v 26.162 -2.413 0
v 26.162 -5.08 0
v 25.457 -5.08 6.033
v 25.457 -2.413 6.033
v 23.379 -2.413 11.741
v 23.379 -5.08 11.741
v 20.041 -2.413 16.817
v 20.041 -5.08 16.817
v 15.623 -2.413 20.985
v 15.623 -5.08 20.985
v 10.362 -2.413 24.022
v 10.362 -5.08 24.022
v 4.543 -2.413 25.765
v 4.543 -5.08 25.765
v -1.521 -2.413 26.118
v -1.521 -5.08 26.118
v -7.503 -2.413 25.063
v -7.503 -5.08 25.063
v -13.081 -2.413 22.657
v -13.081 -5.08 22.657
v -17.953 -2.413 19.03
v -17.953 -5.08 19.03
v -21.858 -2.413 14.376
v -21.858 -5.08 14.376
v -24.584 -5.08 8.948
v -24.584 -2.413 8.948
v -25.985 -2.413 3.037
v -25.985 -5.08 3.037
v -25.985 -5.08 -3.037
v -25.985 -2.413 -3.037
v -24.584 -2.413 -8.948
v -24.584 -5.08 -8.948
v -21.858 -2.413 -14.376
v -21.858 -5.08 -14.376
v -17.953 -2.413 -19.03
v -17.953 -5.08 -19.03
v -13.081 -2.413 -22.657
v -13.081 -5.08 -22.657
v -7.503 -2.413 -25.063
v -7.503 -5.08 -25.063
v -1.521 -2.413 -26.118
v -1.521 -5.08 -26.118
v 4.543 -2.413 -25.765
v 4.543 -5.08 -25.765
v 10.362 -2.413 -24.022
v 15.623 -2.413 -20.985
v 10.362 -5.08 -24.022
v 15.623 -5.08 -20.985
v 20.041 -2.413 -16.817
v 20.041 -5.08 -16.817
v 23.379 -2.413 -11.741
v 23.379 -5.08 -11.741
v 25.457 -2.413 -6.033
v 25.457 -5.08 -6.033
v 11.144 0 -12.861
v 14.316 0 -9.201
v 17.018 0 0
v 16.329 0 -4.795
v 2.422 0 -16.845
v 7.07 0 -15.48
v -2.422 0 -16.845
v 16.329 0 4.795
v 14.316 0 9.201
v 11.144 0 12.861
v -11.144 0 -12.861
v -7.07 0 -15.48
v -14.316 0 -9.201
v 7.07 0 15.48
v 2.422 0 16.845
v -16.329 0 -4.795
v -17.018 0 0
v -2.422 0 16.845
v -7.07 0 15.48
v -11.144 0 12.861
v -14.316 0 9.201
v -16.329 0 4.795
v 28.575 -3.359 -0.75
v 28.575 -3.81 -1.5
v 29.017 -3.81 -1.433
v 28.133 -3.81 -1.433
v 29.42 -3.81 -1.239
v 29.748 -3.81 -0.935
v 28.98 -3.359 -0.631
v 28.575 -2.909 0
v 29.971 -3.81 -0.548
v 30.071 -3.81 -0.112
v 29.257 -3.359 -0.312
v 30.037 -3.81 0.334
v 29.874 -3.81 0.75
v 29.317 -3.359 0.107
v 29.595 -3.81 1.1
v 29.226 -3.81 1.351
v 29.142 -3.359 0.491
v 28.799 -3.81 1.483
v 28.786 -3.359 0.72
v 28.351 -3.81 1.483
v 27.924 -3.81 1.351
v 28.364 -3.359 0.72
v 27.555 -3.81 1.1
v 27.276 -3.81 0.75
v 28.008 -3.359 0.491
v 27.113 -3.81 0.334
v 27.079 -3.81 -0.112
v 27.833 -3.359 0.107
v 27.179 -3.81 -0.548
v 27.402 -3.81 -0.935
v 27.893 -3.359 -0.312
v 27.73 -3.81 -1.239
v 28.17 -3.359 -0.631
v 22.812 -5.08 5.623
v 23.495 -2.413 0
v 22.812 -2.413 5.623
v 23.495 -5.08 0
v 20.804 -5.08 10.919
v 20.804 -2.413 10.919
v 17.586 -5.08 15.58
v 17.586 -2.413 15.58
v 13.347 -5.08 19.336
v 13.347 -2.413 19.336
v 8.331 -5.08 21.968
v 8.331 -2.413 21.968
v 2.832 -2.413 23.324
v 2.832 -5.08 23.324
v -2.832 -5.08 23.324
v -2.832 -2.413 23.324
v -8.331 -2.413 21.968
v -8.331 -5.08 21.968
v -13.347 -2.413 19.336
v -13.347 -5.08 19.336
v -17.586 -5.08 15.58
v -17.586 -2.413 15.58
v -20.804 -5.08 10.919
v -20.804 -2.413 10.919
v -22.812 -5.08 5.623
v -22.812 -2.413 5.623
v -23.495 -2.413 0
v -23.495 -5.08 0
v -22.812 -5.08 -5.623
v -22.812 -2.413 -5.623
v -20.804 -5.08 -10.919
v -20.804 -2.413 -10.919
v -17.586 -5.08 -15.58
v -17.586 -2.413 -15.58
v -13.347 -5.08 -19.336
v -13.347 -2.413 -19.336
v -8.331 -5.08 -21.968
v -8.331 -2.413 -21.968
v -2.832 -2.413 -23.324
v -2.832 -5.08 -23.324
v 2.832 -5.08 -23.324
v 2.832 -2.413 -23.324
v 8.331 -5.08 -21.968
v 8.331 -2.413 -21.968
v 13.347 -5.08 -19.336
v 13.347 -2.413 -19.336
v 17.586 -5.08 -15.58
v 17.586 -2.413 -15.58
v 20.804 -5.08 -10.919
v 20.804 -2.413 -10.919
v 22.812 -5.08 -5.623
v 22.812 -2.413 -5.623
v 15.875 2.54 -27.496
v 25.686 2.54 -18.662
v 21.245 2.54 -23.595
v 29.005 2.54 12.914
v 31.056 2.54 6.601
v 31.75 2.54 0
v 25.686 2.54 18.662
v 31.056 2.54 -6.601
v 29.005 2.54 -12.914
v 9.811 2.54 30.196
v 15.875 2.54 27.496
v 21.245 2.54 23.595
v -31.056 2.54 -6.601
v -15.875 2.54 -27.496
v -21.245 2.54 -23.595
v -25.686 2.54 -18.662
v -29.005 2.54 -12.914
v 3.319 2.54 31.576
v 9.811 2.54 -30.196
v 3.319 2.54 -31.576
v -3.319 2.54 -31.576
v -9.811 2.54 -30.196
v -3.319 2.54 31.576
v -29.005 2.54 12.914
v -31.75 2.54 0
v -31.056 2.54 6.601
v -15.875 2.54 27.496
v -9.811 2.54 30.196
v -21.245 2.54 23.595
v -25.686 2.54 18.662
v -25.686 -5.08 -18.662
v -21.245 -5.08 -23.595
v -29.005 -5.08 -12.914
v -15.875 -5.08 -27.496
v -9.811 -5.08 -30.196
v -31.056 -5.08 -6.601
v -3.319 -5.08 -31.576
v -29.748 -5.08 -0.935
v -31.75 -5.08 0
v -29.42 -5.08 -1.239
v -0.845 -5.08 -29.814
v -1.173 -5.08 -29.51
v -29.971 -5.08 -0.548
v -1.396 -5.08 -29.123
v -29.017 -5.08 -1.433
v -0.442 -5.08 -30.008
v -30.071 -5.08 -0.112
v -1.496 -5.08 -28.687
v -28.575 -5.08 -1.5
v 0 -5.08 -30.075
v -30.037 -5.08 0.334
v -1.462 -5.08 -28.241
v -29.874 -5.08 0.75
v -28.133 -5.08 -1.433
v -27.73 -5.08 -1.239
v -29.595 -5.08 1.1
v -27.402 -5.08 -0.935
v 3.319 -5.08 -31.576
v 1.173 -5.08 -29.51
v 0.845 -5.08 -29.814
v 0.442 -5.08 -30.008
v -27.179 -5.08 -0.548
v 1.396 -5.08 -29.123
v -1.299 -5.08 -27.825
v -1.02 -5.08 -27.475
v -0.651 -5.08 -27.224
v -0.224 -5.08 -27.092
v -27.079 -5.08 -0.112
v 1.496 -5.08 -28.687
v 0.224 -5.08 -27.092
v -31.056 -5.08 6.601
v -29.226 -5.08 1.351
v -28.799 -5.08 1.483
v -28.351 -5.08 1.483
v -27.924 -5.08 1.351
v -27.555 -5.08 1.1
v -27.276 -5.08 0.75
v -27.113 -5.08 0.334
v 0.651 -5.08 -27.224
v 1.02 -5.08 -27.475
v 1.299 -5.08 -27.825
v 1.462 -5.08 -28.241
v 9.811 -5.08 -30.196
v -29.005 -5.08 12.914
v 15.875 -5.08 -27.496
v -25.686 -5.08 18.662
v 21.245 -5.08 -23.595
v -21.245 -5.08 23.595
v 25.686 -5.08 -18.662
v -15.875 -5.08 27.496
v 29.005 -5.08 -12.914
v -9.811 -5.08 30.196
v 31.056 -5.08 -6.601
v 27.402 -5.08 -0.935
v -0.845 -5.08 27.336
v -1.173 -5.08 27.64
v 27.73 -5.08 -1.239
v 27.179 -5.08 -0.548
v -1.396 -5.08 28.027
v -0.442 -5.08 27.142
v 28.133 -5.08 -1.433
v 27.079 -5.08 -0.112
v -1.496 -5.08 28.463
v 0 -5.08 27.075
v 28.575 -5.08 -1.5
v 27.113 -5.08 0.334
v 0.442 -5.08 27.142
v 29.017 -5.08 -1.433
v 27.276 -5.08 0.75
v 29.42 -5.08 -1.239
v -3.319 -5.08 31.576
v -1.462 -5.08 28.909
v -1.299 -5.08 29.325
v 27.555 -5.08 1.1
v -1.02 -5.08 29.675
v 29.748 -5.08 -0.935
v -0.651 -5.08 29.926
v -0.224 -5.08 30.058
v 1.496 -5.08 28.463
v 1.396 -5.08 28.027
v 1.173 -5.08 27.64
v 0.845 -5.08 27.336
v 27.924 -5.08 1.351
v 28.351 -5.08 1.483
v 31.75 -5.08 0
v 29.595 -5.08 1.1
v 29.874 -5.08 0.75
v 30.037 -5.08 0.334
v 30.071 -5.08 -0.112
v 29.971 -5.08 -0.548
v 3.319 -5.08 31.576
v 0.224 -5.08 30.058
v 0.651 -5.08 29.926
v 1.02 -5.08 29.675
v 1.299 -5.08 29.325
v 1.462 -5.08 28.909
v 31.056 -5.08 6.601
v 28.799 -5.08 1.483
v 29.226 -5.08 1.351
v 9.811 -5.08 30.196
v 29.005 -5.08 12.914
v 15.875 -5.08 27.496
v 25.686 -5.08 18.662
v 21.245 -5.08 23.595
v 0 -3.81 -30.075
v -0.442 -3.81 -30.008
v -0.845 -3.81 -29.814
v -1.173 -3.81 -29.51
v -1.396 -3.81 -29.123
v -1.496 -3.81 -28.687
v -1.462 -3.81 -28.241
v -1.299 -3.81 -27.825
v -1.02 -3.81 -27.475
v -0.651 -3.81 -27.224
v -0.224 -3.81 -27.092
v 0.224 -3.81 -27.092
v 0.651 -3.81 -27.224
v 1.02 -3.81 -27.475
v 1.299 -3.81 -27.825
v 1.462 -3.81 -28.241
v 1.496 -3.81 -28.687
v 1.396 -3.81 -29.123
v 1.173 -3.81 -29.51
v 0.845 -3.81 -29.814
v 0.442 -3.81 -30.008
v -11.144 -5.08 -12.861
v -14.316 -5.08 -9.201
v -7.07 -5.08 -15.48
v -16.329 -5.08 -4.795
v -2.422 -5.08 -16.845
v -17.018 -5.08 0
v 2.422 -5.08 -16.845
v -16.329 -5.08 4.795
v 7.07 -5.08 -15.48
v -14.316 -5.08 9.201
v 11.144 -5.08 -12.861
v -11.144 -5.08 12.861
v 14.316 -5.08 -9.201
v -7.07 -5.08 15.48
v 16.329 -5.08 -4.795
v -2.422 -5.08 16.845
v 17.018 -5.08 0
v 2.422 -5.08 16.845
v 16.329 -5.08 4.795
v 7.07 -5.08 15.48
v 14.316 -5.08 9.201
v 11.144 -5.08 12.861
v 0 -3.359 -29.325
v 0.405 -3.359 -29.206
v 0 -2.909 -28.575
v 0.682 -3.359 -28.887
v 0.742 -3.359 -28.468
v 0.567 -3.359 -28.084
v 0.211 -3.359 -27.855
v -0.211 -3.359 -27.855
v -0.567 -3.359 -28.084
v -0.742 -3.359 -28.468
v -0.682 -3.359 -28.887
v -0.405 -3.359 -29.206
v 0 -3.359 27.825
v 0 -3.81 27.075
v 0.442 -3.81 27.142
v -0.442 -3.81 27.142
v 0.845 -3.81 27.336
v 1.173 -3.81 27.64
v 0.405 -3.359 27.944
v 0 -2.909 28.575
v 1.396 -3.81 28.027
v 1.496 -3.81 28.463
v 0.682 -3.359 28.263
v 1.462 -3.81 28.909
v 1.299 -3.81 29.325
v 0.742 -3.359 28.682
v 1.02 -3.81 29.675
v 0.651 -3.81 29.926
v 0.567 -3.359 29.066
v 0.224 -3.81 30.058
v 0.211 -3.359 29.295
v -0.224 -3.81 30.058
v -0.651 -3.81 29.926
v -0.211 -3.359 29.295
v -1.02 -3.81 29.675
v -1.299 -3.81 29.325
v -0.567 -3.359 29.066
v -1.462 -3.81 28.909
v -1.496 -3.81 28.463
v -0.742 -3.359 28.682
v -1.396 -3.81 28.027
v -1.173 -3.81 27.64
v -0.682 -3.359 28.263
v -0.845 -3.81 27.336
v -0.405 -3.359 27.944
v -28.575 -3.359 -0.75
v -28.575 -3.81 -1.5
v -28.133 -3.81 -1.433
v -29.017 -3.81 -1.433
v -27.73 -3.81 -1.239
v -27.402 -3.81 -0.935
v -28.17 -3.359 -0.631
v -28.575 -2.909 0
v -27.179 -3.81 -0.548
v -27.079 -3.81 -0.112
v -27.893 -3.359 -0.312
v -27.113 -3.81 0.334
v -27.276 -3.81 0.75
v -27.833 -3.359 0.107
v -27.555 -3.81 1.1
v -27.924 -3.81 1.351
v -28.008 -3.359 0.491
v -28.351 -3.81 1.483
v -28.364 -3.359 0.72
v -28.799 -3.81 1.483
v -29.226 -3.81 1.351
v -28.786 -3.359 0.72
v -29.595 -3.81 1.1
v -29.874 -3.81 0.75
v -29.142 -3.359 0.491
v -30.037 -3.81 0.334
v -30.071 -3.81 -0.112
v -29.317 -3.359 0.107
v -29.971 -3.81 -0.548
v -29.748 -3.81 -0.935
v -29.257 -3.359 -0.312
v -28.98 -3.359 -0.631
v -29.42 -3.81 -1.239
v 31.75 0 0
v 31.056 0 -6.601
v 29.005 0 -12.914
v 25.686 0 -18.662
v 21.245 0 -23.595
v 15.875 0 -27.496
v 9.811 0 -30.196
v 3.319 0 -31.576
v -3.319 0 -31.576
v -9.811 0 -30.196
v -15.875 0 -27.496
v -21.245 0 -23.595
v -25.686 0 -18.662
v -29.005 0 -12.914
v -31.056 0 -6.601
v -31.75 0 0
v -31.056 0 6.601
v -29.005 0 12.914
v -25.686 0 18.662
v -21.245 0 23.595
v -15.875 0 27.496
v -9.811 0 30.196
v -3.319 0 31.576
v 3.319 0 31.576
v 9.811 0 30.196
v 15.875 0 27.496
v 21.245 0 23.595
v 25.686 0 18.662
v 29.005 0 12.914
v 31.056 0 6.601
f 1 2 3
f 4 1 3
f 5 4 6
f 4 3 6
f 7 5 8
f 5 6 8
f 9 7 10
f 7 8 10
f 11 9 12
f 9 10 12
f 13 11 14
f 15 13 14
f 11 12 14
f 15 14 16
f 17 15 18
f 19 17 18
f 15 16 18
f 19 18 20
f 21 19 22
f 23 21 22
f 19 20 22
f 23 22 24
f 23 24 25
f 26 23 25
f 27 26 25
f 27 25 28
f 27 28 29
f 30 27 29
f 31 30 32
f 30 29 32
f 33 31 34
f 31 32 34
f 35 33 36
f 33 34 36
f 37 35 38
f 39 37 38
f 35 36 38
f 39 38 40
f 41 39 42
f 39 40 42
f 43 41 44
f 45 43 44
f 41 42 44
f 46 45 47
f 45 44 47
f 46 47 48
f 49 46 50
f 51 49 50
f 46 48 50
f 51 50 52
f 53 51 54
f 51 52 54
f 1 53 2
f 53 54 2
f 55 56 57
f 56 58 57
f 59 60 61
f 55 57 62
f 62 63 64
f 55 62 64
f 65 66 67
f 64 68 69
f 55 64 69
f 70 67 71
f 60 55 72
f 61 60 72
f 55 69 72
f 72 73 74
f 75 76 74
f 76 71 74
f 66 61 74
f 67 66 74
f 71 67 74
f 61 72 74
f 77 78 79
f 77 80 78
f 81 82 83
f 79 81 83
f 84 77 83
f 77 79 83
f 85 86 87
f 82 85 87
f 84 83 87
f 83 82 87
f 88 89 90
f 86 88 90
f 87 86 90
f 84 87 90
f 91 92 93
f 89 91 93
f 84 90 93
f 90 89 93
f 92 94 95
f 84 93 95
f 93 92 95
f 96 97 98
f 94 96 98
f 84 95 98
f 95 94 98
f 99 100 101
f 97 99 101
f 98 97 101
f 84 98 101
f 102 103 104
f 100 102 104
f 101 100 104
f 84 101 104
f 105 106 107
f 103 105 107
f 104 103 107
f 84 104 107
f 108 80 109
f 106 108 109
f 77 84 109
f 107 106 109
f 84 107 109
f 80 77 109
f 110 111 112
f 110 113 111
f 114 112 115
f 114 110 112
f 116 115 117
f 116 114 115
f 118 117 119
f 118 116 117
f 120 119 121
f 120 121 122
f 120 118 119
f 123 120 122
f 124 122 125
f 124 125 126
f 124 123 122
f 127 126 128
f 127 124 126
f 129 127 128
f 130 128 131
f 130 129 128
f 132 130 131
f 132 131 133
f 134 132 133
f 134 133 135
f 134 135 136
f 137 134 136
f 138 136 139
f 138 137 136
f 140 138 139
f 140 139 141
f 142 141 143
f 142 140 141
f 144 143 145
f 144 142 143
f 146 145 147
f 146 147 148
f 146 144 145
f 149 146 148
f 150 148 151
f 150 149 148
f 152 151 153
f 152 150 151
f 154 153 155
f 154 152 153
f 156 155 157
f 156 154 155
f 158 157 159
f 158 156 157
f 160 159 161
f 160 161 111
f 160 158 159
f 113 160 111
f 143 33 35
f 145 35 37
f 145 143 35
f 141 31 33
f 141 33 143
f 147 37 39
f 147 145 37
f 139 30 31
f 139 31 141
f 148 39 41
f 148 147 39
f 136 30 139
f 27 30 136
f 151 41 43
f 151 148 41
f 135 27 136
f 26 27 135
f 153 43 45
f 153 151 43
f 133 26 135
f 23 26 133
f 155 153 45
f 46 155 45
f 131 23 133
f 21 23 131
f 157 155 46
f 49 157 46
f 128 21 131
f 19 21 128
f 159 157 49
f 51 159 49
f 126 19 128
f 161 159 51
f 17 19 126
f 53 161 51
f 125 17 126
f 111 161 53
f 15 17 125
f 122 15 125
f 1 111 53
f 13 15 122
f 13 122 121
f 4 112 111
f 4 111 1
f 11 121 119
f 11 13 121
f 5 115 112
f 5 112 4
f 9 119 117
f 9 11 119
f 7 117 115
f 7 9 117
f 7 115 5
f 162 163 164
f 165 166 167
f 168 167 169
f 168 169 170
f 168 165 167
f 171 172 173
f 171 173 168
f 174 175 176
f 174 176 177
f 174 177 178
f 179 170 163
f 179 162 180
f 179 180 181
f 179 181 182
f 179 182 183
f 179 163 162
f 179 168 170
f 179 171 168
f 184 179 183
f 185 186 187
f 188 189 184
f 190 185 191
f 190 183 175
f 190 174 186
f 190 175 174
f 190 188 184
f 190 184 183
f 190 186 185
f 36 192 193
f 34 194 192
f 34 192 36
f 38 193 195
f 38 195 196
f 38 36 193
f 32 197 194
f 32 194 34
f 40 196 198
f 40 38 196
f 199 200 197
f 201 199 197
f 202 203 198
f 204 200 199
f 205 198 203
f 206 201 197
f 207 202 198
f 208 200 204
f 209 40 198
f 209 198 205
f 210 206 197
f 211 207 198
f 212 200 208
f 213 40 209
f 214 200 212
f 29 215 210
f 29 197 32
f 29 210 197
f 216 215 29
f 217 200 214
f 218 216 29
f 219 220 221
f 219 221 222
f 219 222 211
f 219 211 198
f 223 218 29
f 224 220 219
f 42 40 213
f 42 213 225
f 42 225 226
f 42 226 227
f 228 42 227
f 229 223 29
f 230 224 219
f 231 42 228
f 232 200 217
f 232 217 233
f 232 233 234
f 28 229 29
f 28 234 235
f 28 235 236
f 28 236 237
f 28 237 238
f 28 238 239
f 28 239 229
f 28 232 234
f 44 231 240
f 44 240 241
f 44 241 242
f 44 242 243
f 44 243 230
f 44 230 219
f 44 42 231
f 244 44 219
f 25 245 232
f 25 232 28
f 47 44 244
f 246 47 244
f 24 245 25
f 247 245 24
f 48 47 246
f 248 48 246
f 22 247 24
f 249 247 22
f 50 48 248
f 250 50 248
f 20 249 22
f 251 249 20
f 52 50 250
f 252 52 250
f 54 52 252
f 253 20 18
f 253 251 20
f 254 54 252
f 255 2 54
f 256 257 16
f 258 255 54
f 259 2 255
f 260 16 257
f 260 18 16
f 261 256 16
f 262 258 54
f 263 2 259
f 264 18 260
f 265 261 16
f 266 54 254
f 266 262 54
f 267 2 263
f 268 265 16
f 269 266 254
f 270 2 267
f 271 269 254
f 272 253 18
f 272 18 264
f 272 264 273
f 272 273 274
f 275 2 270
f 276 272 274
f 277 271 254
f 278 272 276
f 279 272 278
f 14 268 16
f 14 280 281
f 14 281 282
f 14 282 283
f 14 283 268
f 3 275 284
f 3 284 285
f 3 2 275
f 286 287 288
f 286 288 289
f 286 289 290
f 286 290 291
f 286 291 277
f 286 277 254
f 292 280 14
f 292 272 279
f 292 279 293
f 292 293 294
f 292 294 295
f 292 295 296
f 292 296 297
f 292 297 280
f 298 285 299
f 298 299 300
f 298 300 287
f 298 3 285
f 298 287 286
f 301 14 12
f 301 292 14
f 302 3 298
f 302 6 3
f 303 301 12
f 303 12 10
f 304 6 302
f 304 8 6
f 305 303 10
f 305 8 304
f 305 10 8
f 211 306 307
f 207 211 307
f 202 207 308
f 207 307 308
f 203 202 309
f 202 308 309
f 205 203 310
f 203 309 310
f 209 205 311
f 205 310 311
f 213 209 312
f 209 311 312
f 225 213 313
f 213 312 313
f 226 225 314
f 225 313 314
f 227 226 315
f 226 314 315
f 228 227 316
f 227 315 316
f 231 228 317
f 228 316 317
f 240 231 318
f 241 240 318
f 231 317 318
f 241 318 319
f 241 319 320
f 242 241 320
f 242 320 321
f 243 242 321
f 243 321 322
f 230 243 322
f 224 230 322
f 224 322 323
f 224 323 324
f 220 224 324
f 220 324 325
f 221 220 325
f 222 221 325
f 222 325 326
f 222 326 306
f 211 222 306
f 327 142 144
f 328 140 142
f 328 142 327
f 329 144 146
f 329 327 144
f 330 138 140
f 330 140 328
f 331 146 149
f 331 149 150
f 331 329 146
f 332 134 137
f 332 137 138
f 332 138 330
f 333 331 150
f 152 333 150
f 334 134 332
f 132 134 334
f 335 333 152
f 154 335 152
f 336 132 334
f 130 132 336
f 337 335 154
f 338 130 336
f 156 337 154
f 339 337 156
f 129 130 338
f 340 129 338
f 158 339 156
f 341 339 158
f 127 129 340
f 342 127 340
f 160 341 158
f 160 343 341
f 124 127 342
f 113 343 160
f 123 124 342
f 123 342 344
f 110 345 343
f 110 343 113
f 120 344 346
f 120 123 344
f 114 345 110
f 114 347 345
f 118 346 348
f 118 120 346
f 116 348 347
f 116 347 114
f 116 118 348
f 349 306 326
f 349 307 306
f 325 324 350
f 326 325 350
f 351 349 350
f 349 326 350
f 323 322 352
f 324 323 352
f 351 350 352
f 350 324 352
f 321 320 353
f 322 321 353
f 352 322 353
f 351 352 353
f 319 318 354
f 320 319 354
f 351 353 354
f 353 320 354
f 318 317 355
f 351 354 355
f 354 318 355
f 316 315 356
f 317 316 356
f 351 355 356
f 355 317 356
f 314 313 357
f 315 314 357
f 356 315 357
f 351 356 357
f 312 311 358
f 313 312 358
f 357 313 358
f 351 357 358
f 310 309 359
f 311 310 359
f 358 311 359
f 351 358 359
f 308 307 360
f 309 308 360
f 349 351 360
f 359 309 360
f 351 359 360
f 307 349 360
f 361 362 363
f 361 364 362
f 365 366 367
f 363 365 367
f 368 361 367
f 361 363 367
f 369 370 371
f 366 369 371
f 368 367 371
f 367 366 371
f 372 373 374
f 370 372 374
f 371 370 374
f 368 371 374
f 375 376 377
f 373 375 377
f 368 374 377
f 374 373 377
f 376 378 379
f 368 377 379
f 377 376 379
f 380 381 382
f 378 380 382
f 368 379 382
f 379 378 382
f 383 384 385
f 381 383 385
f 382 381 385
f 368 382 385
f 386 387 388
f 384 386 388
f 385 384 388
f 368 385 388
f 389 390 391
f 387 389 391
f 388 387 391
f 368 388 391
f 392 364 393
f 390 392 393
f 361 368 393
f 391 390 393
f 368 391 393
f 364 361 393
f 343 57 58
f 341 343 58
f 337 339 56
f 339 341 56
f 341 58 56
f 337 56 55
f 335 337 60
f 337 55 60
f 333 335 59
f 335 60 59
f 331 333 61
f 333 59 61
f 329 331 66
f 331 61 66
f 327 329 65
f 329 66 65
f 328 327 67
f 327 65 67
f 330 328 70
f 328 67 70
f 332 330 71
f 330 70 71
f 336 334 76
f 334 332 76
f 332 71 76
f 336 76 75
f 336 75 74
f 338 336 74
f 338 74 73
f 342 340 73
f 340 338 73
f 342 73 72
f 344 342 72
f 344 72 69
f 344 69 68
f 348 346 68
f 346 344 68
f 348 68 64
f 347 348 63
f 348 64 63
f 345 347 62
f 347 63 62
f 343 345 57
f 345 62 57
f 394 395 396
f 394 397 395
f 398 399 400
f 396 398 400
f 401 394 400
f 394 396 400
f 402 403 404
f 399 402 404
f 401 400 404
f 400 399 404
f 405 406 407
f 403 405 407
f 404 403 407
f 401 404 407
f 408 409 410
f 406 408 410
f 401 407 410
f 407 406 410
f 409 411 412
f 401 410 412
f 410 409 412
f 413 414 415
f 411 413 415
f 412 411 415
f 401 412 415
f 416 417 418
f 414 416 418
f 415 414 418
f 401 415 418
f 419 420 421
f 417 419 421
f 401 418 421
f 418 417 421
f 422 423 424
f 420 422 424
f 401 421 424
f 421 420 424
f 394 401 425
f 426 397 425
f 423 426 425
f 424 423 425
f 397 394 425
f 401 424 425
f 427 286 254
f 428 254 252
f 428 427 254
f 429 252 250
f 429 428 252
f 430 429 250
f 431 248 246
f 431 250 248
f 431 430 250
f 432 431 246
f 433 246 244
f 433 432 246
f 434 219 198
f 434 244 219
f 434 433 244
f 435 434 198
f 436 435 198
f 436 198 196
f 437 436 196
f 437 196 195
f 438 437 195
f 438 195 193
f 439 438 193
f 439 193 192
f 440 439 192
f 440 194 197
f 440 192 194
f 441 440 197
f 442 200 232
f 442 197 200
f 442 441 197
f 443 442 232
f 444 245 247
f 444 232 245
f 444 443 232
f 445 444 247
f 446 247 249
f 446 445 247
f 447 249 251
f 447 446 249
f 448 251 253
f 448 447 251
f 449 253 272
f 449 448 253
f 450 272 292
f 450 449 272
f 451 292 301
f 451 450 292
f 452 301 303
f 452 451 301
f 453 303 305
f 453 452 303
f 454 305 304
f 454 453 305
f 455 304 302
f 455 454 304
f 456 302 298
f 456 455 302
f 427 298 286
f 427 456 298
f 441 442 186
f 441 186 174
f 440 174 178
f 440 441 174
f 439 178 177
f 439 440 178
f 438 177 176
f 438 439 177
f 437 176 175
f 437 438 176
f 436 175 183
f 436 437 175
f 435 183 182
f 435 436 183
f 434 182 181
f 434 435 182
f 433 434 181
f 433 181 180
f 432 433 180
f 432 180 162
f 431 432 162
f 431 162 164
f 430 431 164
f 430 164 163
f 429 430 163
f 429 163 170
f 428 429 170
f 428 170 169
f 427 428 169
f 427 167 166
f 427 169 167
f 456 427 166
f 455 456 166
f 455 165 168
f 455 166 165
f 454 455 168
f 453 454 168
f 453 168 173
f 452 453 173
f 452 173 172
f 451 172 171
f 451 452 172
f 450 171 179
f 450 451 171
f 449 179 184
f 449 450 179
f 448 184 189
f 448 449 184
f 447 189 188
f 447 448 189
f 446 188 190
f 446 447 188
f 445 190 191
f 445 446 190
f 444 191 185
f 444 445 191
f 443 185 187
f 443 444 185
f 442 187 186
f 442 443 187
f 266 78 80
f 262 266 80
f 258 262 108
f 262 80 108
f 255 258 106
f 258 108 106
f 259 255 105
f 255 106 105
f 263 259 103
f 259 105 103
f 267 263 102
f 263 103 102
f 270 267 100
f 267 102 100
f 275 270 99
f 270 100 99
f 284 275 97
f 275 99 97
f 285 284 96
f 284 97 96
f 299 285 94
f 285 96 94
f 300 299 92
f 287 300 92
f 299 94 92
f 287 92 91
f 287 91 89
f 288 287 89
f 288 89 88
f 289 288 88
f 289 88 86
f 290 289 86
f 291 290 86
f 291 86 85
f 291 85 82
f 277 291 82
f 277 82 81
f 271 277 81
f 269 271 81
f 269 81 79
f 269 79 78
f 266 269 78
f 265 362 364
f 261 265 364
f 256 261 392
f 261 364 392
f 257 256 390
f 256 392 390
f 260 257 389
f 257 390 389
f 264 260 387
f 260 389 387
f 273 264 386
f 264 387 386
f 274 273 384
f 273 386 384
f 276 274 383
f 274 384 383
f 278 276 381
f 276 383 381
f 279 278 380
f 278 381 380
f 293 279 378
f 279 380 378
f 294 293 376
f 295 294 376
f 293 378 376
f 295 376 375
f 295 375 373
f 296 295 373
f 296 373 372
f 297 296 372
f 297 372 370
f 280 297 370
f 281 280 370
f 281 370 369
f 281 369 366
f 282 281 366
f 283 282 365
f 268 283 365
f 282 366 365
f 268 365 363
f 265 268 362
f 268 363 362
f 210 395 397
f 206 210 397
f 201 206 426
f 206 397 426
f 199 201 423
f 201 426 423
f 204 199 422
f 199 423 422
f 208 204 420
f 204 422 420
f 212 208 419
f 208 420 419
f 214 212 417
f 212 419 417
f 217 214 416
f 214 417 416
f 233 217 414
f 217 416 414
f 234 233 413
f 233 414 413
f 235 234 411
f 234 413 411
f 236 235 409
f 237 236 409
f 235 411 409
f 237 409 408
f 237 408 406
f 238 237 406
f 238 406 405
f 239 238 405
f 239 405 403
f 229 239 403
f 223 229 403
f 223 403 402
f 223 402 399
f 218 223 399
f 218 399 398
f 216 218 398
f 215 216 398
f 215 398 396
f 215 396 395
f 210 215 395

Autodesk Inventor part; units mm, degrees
ref_plane "YZ Plane" through (0, 0, 0) normal (1, 0, 0) x (0, 1, 0)
ref_plane "XZ Plane" through (0, 0, 0) normal (0, 1, 0) x (-1, 0, 0)
ref_plane "XY Plane" through (0, 0, 0) normal (0, 0, 1) x (1, 0, 0)
sketch "Sketch1" plane through (0, 0, 0) normal (0, 1, 0) x (-1, 0, 0)
  circle A0 centre (0, 0) radius 31.75
  dimension "d0" = 63.5
extrude "Extrusion1" add sketch "Sketch1" along normal blind 2.54
sketch "Sketch2" plane through (0, 0, 0) normal (0, -1, 0) x (1, 0, 0)
  circle A0 centre (0, 0) radius 31.75 projected
  circle A1 centre (0, 0) radius 17.018
  circle A2 centre (0, 0) radius 31.75
  dimension "d4" = 34.036
extrude "Extrusion2" add sketch "Sketch2" along normal blind 5.08
sketch "Sketch3" plane through (0, -5.08, 0) normal (0, -1, 0) x (1, 0, 0)
  circle A0 centre (0, 0) radius 23.495
  circle A1 centre (0, 0) radius 17.018 projected
  circle A2 centre (0, 0) radius 26.162
  dimension "d7" = 46.99
  dimension "d8" = 52.324
extrude "Extrusion3" cut sketch "Sketch3" against normal blind 2.667 contours A2
sketch "Sketch5" plane through (0, -5.08, 0) normal (0, -1, 0) x (1, 0, 0)
  point P0 (0, 0)
  point P1 (-28.575, 0)
  point P2 (0, -28.575)
  point P3 (28.575, 0)
  point P4 (0, 28.575)
  dimension "d18" = 28.575
  dimension "d32" = 360
hole "Hole1" at (-28.575, -5.08, 0) at (0, -5.08, 28.575) at (28.575, -5.08, 0) at (0, -5.08, -28.575) direction (0, 1, 0) diameter 3 depth 1.27 tip angle 118
properties part number "LED housing 2"
